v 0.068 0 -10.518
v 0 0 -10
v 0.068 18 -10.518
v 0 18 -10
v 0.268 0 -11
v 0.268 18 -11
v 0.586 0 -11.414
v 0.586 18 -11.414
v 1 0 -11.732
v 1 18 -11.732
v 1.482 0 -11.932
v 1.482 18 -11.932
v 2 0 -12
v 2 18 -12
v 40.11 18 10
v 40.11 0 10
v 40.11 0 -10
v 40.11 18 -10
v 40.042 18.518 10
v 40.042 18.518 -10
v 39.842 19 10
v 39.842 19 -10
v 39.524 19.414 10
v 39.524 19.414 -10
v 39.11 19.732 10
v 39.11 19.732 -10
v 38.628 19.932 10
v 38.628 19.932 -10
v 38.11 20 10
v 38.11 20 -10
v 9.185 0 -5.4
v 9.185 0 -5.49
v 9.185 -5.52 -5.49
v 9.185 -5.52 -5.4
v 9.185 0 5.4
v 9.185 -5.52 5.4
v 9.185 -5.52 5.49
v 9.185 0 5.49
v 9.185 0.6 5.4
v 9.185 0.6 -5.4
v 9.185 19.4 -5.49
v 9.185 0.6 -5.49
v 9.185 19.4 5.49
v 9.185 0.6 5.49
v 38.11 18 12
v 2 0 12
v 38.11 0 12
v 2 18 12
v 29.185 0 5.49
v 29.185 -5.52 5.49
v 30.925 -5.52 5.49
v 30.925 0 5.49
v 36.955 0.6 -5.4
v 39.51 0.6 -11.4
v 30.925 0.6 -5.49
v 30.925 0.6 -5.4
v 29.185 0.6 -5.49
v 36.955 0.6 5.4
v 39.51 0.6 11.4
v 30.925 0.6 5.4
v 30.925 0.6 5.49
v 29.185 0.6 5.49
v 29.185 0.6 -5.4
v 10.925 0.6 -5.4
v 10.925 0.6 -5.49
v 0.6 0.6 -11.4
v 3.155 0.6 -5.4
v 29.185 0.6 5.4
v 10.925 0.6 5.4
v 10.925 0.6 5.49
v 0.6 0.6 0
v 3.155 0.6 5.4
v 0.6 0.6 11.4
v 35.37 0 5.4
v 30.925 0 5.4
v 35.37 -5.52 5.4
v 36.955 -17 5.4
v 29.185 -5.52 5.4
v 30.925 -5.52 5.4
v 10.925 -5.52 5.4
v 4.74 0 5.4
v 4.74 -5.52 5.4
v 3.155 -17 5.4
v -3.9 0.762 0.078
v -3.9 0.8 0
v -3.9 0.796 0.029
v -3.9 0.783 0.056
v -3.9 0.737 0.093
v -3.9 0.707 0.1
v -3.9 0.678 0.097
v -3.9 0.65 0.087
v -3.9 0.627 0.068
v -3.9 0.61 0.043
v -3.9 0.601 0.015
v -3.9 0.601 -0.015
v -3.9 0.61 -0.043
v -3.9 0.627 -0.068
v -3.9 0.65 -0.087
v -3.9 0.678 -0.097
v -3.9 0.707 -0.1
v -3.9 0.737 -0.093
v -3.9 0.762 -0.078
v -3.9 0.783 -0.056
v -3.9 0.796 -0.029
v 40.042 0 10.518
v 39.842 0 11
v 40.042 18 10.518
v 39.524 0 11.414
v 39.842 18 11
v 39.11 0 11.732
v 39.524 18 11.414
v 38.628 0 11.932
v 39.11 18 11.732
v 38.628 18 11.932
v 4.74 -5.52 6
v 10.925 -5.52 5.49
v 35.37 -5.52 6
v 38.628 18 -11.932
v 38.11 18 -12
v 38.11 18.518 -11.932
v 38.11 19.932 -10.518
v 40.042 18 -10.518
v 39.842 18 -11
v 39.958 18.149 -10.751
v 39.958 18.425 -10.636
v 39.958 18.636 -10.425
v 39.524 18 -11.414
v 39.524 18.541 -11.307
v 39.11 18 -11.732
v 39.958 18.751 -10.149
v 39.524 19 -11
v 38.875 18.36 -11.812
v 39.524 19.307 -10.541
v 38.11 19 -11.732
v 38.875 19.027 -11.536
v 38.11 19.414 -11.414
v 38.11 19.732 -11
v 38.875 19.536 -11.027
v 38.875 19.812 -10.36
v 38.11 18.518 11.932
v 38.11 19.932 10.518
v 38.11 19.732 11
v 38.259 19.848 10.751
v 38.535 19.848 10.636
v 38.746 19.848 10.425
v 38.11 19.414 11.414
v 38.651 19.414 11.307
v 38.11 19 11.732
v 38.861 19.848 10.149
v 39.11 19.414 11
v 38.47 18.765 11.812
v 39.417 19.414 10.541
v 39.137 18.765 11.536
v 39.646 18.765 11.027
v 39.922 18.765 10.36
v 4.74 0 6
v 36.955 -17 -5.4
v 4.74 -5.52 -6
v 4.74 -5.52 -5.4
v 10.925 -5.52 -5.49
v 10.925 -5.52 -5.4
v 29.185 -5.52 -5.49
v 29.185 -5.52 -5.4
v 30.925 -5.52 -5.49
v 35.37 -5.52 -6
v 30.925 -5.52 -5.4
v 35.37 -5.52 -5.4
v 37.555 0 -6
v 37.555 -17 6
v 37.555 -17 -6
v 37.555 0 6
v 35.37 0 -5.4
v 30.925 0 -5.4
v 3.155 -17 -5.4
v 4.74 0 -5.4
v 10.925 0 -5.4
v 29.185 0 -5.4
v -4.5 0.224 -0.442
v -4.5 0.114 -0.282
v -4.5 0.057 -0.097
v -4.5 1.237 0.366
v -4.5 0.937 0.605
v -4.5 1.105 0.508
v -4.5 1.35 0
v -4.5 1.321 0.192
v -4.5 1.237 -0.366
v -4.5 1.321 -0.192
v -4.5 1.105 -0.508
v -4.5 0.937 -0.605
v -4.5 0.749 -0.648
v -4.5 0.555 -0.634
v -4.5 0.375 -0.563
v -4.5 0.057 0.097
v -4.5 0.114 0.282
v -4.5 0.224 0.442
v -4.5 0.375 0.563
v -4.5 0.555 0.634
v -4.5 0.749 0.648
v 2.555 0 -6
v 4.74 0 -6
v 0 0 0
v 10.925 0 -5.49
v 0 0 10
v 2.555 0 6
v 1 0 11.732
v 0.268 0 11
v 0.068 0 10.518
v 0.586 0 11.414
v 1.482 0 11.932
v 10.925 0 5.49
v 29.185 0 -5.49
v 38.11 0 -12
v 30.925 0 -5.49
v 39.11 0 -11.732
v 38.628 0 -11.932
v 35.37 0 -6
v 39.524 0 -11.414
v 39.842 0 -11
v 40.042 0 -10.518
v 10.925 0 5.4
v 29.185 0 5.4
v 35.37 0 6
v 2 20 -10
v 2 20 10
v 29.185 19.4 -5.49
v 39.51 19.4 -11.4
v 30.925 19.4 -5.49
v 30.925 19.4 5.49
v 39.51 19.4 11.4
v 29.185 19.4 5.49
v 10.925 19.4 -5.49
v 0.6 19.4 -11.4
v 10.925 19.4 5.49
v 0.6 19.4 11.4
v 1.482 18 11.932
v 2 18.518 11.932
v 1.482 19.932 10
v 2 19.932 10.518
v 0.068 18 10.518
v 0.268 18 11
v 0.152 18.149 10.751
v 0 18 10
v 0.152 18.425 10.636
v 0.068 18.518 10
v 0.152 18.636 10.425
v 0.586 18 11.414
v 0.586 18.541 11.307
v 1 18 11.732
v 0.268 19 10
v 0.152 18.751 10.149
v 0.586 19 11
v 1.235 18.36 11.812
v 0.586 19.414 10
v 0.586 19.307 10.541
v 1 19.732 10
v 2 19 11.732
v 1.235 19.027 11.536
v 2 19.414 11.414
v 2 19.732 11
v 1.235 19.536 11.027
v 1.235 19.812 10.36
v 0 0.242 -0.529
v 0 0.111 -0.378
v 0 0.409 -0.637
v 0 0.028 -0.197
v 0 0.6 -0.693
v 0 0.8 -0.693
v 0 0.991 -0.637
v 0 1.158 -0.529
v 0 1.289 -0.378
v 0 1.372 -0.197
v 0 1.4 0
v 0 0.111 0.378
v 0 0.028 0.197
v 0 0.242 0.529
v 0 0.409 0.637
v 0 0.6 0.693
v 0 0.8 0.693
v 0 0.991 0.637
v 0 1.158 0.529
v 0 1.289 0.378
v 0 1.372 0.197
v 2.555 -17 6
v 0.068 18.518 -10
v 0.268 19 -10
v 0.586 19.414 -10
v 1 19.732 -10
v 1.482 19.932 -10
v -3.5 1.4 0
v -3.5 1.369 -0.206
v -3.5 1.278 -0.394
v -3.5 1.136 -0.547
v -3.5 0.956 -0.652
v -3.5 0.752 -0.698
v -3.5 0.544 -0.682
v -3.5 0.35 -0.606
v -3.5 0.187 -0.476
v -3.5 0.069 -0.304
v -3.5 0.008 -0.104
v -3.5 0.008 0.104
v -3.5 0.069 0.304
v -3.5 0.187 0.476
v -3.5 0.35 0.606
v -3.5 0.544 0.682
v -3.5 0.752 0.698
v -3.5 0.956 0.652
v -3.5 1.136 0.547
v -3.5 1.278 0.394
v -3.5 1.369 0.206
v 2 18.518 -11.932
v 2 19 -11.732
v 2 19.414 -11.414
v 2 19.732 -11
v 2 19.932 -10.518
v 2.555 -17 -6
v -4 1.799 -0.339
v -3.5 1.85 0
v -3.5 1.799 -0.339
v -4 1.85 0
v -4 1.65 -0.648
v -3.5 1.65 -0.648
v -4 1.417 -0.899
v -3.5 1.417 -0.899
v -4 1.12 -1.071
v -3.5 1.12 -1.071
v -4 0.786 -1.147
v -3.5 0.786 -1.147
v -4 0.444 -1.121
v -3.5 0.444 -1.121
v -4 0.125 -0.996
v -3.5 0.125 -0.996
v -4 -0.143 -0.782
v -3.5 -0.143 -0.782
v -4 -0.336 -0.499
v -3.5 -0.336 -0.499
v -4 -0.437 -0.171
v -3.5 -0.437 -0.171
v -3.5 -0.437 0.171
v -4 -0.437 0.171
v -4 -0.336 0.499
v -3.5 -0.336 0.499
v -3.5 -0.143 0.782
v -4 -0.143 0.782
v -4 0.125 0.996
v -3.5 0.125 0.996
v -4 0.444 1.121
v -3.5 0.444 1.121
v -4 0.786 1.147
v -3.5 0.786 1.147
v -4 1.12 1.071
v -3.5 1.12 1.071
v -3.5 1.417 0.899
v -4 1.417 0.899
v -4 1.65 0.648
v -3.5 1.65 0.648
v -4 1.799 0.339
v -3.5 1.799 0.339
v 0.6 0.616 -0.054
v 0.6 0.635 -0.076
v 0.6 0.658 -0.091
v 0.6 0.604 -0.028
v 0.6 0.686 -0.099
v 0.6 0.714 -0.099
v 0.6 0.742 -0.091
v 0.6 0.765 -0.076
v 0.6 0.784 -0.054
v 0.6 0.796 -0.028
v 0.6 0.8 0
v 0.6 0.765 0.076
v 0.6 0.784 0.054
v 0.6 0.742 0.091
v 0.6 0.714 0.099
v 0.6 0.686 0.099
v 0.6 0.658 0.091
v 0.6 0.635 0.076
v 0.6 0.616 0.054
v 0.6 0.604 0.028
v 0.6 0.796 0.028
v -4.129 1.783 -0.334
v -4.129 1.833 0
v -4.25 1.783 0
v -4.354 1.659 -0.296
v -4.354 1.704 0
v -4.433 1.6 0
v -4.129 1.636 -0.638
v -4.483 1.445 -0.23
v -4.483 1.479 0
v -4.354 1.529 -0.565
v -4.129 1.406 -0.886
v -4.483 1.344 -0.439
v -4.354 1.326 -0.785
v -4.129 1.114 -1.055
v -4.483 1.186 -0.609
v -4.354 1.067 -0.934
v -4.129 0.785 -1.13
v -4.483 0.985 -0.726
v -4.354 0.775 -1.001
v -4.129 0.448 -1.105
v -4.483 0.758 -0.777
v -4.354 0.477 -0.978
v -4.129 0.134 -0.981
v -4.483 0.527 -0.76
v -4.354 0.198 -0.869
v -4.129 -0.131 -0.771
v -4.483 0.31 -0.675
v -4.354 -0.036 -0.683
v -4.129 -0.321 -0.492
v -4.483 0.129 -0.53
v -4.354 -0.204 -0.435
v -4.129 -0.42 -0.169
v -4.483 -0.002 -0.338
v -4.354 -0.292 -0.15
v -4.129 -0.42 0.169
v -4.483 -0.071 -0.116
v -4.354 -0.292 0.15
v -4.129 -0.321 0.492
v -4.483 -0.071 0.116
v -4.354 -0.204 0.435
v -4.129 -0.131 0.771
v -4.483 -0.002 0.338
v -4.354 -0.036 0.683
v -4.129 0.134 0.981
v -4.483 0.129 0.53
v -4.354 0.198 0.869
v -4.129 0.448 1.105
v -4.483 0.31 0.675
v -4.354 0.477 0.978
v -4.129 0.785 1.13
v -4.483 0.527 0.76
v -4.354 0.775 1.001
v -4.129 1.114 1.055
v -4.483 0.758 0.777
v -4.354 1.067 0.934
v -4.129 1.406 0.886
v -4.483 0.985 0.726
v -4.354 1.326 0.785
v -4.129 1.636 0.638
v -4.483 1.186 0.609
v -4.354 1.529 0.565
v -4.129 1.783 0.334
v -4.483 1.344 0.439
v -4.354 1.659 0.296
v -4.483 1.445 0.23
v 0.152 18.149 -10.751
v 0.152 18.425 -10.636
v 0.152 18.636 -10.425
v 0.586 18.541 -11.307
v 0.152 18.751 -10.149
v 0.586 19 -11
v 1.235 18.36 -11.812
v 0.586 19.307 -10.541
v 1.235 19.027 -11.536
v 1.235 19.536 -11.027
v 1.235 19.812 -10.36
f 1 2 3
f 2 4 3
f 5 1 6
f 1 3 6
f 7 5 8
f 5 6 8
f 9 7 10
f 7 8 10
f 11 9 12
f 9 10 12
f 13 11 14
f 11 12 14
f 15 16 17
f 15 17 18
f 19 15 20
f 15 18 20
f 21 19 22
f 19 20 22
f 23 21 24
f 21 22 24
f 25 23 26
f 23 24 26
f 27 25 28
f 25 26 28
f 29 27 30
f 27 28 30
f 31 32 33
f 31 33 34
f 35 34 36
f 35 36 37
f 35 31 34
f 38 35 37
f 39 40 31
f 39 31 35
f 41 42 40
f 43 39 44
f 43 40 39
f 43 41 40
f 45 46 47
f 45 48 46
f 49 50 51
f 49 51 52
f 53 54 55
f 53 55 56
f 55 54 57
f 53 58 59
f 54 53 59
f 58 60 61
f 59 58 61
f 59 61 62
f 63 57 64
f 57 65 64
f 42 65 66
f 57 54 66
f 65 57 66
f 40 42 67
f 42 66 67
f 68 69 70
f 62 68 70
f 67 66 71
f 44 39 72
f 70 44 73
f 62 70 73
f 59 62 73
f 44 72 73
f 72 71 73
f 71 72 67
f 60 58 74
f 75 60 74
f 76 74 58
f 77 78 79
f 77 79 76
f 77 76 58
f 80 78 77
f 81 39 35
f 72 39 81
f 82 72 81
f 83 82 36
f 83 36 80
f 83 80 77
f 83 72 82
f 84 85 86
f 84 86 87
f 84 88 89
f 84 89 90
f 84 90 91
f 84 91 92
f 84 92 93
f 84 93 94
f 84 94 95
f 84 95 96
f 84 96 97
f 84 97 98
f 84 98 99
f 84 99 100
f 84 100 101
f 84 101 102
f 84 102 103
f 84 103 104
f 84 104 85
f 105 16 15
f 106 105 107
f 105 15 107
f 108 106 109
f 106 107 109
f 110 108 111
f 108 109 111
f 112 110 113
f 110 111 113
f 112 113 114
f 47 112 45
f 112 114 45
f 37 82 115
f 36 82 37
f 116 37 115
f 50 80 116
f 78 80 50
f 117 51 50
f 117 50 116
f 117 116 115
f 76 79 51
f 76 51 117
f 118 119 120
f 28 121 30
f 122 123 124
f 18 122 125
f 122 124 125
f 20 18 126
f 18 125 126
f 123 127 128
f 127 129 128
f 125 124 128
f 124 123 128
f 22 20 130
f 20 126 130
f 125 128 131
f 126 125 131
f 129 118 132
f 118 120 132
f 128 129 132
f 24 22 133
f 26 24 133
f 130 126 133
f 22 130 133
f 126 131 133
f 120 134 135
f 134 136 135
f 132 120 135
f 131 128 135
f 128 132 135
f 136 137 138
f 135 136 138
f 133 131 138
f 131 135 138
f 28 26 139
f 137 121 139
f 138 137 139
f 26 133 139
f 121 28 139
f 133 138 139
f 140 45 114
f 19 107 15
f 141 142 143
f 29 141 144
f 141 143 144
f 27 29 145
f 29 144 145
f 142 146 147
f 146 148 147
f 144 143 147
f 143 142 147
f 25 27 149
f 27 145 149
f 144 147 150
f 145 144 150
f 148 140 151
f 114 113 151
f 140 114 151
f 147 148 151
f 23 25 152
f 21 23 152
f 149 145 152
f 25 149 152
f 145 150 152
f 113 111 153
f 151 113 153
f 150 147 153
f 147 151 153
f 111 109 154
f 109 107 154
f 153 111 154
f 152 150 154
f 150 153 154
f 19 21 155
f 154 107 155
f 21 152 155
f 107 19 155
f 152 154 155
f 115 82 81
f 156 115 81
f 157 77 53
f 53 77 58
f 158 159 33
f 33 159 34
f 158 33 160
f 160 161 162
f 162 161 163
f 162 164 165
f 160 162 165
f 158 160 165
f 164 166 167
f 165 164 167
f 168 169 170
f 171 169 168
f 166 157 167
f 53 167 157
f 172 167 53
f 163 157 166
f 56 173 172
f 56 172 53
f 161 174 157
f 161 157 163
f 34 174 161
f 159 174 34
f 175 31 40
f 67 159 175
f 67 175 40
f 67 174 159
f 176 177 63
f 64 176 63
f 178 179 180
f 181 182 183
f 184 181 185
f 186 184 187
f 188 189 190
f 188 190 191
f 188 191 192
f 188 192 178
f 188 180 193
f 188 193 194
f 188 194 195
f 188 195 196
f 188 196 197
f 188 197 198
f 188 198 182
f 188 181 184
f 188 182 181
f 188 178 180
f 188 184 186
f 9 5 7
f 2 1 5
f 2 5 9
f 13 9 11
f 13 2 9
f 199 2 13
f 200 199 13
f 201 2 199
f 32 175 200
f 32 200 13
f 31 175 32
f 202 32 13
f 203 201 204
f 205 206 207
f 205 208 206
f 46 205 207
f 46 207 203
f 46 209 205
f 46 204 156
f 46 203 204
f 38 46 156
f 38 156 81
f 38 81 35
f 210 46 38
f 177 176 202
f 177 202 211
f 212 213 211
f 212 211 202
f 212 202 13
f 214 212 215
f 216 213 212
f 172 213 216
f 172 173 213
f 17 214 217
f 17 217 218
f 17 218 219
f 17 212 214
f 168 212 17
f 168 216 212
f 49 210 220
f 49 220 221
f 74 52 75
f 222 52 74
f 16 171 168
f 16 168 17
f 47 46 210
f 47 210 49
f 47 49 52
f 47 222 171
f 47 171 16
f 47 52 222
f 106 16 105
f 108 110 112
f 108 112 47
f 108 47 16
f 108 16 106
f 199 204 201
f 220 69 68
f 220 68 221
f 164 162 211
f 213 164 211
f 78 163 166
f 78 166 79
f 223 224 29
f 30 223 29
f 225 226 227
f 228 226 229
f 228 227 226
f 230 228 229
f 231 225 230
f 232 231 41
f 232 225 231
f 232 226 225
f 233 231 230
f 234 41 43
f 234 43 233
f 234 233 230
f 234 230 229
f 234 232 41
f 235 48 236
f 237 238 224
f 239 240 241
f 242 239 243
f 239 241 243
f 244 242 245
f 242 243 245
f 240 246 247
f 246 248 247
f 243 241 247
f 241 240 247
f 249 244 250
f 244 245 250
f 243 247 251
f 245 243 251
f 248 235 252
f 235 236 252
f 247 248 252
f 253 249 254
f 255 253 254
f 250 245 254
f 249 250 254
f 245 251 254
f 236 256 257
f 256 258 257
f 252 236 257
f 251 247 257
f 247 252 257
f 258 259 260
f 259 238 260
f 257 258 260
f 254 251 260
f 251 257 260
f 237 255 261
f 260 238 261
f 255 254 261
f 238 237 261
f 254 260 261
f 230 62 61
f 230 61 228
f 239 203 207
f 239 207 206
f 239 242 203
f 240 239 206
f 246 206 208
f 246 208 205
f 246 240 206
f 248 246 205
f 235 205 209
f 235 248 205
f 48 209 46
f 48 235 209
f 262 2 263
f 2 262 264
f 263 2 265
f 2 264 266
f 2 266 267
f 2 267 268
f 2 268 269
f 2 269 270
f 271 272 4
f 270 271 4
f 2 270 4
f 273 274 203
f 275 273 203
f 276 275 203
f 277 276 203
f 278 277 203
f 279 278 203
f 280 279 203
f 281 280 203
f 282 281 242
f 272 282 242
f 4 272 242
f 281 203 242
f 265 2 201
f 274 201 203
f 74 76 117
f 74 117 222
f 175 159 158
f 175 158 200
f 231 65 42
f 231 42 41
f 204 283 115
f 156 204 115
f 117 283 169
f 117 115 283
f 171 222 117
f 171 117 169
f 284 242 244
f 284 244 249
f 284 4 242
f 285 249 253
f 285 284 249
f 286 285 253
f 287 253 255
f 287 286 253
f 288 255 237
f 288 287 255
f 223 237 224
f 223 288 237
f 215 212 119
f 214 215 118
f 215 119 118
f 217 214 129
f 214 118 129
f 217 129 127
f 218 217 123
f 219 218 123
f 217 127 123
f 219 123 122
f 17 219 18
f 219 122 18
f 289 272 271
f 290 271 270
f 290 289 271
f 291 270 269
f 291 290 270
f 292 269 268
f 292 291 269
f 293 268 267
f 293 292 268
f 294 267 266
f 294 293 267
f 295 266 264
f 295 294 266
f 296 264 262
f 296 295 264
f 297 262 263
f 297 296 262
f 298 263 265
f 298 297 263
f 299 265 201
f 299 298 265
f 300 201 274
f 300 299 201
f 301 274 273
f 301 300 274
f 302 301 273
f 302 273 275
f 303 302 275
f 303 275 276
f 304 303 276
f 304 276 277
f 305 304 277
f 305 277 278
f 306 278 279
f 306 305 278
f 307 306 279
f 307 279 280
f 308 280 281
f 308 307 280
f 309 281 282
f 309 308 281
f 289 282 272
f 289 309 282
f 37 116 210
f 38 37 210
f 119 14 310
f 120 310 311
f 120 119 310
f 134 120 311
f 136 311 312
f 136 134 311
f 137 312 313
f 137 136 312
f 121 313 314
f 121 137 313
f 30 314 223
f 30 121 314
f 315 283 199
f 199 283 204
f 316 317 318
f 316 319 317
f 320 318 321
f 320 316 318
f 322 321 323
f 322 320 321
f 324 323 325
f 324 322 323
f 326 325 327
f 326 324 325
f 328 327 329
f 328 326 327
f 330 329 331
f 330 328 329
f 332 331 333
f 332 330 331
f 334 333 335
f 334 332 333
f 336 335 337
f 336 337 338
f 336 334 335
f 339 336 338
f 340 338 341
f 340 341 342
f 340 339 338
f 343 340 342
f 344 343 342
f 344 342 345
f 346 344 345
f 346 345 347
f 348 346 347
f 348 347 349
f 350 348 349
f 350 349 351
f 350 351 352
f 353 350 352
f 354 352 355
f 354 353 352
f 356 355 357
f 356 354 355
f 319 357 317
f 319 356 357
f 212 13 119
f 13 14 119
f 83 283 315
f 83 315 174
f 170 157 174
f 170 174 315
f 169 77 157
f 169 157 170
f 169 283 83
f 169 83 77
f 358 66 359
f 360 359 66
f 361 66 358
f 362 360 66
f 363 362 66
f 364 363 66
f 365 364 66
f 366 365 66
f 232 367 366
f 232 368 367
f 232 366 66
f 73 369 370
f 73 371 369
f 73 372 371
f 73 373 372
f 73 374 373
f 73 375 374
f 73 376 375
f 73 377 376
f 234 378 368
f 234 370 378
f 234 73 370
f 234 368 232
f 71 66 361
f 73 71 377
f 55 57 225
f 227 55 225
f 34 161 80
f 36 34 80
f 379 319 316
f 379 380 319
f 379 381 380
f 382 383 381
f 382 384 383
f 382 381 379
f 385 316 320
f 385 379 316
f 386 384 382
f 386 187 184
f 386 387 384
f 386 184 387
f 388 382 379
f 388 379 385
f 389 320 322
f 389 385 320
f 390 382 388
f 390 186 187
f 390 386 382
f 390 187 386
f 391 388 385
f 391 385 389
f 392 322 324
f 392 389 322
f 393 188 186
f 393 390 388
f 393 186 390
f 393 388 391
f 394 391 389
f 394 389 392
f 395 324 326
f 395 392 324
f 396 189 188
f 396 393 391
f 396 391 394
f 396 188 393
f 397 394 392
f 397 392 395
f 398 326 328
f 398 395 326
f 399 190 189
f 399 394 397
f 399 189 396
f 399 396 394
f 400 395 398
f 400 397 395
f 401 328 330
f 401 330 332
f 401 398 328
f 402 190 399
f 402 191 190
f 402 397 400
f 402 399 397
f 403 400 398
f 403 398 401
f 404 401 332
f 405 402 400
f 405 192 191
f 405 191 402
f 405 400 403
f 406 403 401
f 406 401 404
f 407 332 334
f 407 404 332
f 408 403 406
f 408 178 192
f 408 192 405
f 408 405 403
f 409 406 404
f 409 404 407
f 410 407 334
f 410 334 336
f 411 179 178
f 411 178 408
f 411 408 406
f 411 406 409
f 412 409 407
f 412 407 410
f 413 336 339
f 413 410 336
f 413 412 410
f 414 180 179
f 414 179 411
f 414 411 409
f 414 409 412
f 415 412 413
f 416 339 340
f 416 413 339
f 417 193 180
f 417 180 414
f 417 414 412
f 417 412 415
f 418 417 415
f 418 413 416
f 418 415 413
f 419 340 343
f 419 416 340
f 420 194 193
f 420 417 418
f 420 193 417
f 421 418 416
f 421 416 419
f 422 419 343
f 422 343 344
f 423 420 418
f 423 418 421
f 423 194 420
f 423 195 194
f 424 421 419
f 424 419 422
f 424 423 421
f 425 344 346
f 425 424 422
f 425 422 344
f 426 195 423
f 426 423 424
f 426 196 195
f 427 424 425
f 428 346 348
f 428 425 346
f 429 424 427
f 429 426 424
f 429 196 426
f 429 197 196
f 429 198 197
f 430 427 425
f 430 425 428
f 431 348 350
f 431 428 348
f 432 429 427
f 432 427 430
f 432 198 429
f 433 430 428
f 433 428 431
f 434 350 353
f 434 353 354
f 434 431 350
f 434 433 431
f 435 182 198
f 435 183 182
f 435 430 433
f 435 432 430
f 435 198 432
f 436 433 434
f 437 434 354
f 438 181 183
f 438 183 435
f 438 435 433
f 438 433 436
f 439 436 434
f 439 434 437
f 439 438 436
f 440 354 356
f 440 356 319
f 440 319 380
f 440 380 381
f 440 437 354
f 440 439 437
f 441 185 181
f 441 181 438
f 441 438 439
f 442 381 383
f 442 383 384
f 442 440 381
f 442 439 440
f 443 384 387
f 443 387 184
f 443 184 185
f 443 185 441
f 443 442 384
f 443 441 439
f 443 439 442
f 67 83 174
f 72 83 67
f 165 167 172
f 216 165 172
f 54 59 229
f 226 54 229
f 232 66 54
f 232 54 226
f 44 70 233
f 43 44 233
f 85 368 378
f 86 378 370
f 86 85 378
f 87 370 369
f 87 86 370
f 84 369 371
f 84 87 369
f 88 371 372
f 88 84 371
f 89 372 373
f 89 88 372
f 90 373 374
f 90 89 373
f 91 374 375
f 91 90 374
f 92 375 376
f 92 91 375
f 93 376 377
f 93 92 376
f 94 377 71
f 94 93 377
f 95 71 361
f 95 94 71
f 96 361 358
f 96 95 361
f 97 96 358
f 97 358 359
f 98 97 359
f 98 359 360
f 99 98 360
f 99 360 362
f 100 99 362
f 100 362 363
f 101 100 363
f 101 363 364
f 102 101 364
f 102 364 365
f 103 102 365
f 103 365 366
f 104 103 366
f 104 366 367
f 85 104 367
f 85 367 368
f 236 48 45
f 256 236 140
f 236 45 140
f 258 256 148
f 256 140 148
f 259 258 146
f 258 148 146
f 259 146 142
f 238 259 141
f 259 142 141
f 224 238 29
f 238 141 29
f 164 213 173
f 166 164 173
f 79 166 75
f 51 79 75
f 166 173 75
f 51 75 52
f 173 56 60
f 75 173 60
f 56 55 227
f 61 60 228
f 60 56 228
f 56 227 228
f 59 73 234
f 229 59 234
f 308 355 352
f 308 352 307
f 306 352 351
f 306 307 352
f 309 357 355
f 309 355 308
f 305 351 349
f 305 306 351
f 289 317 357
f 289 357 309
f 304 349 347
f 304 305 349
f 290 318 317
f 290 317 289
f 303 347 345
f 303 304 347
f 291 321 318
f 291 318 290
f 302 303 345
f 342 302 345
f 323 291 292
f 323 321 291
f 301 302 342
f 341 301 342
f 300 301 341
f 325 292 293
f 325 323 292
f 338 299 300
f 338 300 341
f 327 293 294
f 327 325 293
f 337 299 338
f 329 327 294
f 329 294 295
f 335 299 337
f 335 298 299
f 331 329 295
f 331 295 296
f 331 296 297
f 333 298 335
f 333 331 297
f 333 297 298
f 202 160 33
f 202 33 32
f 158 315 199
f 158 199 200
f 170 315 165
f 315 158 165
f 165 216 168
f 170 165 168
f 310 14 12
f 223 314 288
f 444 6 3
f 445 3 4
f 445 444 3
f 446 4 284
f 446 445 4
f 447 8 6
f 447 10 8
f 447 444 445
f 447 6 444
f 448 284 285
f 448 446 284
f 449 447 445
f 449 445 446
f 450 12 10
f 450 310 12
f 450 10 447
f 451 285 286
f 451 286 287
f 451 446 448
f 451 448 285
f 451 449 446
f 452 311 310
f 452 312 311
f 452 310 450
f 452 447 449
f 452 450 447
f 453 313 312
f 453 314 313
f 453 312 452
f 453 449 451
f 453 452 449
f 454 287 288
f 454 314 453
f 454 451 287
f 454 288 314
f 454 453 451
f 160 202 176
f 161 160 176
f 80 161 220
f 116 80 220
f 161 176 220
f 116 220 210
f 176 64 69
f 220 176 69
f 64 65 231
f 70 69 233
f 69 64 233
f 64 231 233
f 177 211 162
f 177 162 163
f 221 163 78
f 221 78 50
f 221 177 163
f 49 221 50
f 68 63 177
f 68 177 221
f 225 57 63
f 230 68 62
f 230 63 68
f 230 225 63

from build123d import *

# Parameters (mm, degrees)
SKETCH1_W                      = 40.11
SKETCH1_H                      = 20
BOSS_EXTRUDE1_DEPTH            = 12
SKETCH2_W                      = 35
SKETCH2_H                      = 17
BOSS_EXTRUDE2_DEPTH            = 6
SHELL1_START                   = 3.155
SHELL1_DEPTH                   = 33.8
SHELL1_START_2                 = 0.6
SHELL1_2_OUTLINE_W             = 18.8
SHELL1_2_OUTLINE_H             = 22.8
SHELL1_2_DEPTH                 = 38.91
SHELL1_START_3                 = -3.9
SHELL1_3_OUTLINE_R             = 0.1
SHELL1_3_DEPTH                 = 4.5
CUT_EXTRUDE1_REACH             = 48.398
SKETCH4_W                      = 30.63
SKETCH4_H                      = 5.52
CUT_EXTRUDE1_DIRECTION_2_REACH = 48.398
BOSS_EXTRUDE3_START            = 9.13
SKETCH5_W                      = 10.98
SKETCH5_H                      = 24.92
BOSS_EXTRUDE3_DEPTH            = 1.74
FILLET1_R                      = 2


# Read off the part's stored shape, not the designer's step: Shell1
with BuildPart() as part:
    # Sketch1 → Boss-Extrude1 (new, symmetric)
    with BuildSketch(Plane.XY):
        with Locations((20.055, 10)):
            Rectangle(SKETCH1_W, SKETCH1_H)
    extrude(amount=BOSS_EXTRUDE1_DEPTH, both=True)

    # Sketch2 → Boss-Extrude2 (add, symmetric)
    with BuildSketch(Plane.XY):
        with Locations((20.055, -8.5)):
            Rectangle(SKETCH2_W, SKETCH2_H)
    extrude(amount=BOSS_EXTRUDE2_DEPTH, both=True)

    # Sketch3 → Revolve1 (revolve)
    with BuildSketch(Plane.XY, mode=Mode.PRIVATE) as revolve1_sk:
        with BuildLine():
            Line((0, 0), (-3.5, 0))
            Line((-3.5, 0), (-3.5, -0.45))
            Line((-3.5, -0.45), (-4, -0.45))
            ThreePointArc((-4, -0.45), (-4.353553391, -0.303553391), (-4.5, 0.05))
            Line((-4.5, 0.05), (-4.5, 0.7))
            Line((-4.5, 0.7), (0, 0.7))
            Line((0, 0.7), (0, 0))
        make_face()
    revolve(revolve1_sk.sketch.rotate(Axis((0, 0.7, 0), (-1, 0, 0)), 180), axis=Axis((0, 0.7, 0), (-1, 0, 0)))

    # Shell1 outline → Shell1 (cut)
    with BuildSketch(Plane.YZ.offset(SHELL1_START)):
        Polygon((0.6, -5.4), (0.6, -11.4), (19.4, -11.4), (19.4, 11.4), (0.6, 11.4), (0.6, 5.4), (-17, 5.4), (-17, -5.4), align=None)
    extrude(amount=SHELL1_DEPTH, mode=Mode.SUBTRACT)

    # Shell1 2 outline → Shell1 2 (cut)
    with BuildSketch(Plane.YZ.offset(SHELL1_START_2)):
        with Locations((10, 0)):
            Rectangle(SHELL1_2_OUTLINE_W, SHELL1_2_OUTLINE_H)
    extrude(amount=SHELL1_2_DEPTH, mode=Mode.SUBTRACT)

    # Shell1 3 outline → Shell1 3 (cut)
    with BuildSketch(Plane.YZ.offset(SHELL1_START_3)):
        with Locations((0.7, 0)):
            Circle(SHELL1_3_OUTLINE_R)
    extrude(amount=SHELL1_3_DEPTH, mode=Mode.SUBTRACT)

    # Sketch4 → Cut-Extrude1 (cut, up to next)
    with BuildSketch(Plane.XY, mode=Mode.PRIVATE) as cut_extrude1_sk1:
        with Locations((20.055, -2.76)):
            Rectangle(SKETCH4_W, SKETCH4_H)
    cut_extrude1_tool1 = extrude(cut_extrude1_sk1.sketch, amount=-CUT_EXTRUDE1_REACH, mode=Mode.PRIVATE) & part.part
    add(cut_extrude1_tool1.solids().sort_by_distance((20.055, -2.76, 0))[0], mode=Mode.SUBTRACT)

    # Sketch4 → Cut-Extrude1 direction 2 (cut, up to next)
    with BuildSketch(Plane.XY, mode=Mode.PRIVATE) as cut_extrude1_direction_2_sk1:
        with Locations((20.055, -2.76)):
            Rectangle(SKETCH4_W, SKETCH4_H)
    cut_extrude1_direction_2_tool1 = extrude(cut_extrude1_direction_2_sk1.sketch, amount=CUT_EXTRUDE1_DIRECTION_2_REACH, mode=Mode.PRIVATE) & part.part
    add(cut_extrude1_direction_2_tool1.solids().sort_by_distance((20.055, -2.76, 0))[0], mode=Mode.SUBTRACT)

    # Sketch5 → Boss-Extrude3 (add)
    with BuildSketch(Plane.ZY.offset(-20.055).offset(BOSS_EXTRUDE3_START)):
        with Locations((0, 6.94)):
            Rectangle(SKETCH5_W, SKETCH5_H)
    boss_extrude3 = extrude(amount=BOSS_EXTRUDE3_DEPTH)

    # Mirror1: Boss-Extrude3 across plane
    add(boss_extrude3.mirror(Plane.ZY.offset(-20.055)))

    # Fillet1
    fillet1_edges = [part.edges().sort_by_distance(p)[0] for p in [
        (40.11, 10, 12),
        (20.055, 20, 12),
        (0, 10, 12),
        (20.055, 20, -12),
        (40.11, 10, -12),
        (0, 10, -12),
        (0, 20, 0),
        (40.11, 20, 0),
    ]]
    fillet(fillet1_edges, radius=FILLET1_R)


solid = part.part
